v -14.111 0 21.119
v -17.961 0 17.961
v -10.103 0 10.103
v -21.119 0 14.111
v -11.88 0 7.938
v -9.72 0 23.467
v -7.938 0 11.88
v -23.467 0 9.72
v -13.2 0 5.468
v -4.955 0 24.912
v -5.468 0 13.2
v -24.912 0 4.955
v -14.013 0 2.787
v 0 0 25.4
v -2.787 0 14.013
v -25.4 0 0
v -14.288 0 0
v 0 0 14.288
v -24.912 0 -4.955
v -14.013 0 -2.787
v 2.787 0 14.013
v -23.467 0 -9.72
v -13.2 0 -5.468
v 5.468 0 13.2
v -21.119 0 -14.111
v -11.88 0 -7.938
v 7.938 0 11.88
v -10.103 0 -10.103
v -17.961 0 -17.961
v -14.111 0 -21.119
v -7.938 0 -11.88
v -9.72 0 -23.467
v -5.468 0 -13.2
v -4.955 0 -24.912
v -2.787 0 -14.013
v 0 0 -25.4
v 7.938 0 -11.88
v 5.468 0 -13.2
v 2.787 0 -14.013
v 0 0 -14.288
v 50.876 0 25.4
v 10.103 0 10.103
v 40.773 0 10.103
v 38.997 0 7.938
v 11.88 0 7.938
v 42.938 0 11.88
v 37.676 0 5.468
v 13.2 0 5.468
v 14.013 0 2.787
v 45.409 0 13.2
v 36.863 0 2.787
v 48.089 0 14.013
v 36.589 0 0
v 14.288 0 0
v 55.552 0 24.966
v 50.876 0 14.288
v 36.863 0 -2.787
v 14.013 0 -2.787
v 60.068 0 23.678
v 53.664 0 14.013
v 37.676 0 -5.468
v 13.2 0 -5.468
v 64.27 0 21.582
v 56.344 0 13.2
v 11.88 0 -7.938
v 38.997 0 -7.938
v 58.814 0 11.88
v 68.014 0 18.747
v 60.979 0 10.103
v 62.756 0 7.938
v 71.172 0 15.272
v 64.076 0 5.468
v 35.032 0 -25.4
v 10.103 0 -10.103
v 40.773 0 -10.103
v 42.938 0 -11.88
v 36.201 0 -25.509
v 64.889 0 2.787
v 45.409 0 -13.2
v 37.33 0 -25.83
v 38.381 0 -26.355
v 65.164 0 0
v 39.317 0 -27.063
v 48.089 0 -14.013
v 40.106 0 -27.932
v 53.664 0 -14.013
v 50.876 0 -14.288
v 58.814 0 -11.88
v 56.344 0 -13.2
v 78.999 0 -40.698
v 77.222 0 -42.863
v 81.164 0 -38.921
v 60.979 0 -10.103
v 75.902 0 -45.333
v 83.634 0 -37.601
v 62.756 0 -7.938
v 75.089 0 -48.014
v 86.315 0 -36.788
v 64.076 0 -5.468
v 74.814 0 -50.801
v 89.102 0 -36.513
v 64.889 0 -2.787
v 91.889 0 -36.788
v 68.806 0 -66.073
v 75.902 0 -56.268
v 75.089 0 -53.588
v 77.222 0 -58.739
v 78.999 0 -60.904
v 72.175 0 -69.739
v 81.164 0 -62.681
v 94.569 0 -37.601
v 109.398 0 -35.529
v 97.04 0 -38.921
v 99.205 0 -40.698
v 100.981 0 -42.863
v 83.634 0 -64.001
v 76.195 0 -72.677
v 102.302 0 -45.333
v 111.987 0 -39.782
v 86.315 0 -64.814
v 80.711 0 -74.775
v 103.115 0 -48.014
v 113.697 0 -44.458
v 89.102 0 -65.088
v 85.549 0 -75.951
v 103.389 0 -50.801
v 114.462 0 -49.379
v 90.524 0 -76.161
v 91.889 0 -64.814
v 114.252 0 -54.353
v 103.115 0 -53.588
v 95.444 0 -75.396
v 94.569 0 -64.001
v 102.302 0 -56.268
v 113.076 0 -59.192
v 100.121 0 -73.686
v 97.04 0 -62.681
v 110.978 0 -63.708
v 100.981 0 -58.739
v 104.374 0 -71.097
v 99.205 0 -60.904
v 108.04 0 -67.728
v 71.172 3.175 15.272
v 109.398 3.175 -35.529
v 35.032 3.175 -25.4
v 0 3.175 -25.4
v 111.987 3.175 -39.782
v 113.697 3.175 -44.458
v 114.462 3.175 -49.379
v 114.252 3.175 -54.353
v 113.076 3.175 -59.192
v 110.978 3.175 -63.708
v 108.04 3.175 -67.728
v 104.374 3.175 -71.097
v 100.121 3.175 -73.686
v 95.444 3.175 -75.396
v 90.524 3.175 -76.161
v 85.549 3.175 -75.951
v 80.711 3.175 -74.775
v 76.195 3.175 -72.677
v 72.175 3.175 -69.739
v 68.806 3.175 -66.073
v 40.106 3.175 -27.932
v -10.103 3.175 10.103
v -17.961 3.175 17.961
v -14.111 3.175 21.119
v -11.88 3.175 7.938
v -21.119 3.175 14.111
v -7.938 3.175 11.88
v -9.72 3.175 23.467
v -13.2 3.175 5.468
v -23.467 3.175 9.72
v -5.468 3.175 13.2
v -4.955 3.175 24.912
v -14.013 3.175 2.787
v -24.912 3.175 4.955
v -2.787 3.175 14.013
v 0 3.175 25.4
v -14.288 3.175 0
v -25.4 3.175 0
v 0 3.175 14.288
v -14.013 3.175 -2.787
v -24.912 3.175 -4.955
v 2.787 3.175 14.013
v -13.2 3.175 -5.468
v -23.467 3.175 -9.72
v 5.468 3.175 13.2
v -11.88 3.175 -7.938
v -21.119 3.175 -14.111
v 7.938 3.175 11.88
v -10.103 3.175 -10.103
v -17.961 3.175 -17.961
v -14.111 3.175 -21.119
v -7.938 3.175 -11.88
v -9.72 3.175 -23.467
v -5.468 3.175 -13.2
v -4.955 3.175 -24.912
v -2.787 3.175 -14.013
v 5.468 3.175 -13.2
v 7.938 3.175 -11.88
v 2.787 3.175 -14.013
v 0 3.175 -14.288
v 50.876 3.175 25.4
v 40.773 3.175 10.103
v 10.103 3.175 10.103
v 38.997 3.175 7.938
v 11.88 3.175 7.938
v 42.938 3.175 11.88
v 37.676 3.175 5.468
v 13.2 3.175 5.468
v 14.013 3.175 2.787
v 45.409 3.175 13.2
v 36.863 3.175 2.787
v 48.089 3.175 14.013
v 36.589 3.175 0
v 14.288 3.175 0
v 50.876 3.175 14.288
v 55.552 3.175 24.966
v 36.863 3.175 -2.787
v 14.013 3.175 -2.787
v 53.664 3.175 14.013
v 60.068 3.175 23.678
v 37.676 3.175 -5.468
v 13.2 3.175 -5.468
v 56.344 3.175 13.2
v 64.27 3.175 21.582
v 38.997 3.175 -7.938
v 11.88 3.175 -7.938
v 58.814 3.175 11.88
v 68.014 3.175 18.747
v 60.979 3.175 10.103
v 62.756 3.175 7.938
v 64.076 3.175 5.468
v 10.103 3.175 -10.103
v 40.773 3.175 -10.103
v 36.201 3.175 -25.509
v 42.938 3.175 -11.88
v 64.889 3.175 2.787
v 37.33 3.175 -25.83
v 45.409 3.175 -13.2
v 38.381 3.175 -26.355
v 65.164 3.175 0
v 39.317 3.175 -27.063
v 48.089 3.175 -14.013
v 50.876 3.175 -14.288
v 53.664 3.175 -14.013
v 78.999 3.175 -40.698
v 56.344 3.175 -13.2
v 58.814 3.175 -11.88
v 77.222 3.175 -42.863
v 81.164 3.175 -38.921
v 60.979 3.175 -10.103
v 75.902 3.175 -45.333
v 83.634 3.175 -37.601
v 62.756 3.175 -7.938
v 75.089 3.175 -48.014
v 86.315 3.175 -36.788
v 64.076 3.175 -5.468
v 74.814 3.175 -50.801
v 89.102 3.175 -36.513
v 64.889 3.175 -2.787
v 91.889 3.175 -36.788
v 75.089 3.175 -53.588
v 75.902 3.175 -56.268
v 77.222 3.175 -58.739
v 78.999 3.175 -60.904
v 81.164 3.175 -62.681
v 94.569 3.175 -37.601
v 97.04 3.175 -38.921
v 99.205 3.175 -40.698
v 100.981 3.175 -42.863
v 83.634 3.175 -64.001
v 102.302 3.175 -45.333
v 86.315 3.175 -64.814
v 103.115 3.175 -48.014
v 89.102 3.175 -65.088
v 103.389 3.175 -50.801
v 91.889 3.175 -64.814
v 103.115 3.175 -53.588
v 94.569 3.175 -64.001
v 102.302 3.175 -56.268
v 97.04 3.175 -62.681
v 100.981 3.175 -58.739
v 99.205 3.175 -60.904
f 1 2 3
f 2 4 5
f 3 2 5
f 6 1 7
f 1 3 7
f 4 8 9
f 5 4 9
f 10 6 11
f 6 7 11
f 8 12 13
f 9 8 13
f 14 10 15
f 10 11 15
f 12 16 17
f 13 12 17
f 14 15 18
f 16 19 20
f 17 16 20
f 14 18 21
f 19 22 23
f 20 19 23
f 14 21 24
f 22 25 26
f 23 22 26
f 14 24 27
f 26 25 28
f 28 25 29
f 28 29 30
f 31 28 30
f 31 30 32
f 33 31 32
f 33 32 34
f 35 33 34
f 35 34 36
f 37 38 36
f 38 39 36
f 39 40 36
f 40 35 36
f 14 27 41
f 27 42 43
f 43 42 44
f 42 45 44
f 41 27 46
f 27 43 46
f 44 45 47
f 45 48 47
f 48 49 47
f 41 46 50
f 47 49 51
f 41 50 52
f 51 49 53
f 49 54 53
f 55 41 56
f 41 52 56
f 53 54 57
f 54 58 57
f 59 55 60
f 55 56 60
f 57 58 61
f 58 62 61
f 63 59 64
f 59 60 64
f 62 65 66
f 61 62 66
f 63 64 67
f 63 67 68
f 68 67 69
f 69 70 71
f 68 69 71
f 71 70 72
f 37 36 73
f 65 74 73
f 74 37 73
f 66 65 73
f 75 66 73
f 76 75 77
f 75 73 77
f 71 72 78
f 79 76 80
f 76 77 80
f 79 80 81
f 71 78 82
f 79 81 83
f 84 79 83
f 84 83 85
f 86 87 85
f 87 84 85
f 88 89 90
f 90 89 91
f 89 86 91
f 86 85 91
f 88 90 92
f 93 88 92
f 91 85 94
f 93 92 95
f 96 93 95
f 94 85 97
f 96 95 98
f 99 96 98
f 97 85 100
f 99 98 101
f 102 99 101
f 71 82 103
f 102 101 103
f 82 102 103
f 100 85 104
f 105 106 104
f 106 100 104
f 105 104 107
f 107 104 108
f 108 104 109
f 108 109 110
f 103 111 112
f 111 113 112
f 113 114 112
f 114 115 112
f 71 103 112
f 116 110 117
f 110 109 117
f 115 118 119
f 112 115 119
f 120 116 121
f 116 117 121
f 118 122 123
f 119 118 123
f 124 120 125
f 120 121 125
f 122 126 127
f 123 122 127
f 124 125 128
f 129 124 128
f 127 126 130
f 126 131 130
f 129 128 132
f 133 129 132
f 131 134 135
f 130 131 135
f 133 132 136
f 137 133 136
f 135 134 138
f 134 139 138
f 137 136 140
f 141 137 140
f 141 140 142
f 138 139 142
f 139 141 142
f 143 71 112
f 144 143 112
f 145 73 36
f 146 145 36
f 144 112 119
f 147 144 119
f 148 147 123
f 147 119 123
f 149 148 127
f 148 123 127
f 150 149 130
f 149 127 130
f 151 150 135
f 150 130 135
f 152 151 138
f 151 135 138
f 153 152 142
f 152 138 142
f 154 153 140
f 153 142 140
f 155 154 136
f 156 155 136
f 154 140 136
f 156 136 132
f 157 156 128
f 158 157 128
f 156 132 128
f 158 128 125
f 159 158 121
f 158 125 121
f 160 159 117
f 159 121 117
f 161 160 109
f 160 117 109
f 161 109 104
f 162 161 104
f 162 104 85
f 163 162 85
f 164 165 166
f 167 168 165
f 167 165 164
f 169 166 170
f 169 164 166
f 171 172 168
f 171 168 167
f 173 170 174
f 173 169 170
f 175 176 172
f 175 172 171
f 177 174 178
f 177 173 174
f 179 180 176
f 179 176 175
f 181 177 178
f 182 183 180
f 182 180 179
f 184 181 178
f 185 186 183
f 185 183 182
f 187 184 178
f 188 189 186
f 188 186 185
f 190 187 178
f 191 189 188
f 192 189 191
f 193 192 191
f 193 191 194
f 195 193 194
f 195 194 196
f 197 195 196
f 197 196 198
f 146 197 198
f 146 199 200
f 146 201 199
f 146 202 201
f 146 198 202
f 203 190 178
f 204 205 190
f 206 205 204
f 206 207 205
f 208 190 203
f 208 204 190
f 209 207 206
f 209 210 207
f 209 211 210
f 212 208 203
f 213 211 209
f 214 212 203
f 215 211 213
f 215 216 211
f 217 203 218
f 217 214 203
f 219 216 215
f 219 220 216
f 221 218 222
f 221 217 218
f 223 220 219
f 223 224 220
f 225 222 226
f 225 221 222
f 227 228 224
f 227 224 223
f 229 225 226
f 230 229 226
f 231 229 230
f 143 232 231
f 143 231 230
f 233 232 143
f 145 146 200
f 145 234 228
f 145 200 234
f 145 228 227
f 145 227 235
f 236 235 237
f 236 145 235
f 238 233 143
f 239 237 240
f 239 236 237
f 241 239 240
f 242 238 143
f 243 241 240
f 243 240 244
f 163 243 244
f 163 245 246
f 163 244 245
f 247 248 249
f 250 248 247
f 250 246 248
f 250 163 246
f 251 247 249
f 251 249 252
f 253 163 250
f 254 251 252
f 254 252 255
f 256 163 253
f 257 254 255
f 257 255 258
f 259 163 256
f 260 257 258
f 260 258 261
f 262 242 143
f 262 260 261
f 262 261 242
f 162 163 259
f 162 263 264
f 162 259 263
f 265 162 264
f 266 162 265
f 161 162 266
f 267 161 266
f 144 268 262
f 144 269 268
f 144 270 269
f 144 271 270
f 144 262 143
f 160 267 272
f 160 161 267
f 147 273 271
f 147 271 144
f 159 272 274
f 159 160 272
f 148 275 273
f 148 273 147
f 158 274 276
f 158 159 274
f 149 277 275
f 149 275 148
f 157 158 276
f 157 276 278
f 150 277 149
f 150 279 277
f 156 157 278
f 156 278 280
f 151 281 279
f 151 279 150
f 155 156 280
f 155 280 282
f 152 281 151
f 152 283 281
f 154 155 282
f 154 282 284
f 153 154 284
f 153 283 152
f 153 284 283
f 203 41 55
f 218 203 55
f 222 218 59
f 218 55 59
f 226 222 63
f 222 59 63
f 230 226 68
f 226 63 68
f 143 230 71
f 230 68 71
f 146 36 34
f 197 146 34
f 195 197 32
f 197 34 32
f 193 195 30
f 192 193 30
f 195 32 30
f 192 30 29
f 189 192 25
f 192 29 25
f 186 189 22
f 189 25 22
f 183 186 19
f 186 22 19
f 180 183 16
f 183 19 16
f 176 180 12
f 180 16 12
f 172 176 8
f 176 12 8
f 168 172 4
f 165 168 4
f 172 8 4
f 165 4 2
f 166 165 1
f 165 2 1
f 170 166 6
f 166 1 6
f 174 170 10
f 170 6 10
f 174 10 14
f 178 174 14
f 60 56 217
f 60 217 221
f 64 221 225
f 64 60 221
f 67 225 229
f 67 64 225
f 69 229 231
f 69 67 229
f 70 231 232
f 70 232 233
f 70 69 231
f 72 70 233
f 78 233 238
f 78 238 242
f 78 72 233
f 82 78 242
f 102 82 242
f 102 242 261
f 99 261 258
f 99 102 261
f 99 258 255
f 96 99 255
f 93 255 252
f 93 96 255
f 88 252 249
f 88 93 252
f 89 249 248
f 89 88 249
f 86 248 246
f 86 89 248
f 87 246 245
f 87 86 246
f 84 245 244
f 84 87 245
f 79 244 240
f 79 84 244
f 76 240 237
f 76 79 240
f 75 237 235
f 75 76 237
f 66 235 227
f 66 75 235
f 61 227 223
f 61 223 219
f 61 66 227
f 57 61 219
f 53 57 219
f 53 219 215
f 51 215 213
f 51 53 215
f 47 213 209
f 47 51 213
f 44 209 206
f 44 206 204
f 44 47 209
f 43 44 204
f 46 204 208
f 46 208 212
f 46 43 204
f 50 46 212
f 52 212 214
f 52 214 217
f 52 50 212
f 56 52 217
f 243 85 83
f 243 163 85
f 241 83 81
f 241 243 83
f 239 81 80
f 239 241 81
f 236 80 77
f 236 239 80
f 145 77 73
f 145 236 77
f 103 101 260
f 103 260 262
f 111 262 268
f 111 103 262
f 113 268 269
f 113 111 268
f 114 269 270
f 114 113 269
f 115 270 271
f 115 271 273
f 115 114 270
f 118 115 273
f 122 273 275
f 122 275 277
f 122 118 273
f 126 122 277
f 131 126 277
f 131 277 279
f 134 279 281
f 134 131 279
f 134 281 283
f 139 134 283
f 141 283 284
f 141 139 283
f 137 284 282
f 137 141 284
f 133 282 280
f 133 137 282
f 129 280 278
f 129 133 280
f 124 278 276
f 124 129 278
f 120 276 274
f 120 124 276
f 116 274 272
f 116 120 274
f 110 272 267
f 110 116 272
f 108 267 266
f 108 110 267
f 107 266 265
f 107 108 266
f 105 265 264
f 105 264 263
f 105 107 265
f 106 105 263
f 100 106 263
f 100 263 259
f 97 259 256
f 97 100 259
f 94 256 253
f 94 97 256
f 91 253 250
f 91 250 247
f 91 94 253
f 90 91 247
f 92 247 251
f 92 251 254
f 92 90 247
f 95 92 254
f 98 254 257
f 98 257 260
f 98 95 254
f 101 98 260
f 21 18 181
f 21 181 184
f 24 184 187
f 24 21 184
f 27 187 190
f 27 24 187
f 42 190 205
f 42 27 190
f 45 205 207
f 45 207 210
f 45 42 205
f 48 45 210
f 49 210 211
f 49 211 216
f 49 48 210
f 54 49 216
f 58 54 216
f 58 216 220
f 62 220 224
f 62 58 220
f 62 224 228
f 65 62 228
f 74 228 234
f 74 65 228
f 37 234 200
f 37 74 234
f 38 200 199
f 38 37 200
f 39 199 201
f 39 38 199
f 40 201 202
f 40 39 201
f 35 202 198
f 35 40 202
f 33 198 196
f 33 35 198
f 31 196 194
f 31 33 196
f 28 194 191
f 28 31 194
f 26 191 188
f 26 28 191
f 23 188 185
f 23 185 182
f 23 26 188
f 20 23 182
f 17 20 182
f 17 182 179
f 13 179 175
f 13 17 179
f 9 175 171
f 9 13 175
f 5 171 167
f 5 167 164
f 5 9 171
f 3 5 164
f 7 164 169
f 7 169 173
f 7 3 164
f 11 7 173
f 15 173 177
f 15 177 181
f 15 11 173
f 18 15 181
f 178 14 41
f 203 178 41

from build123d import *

# Parameters (mm, degrees)
SKETCH1_R           = 14.2875
BOSS_EXTRUDE1_DEPTH = 3.175
FILLET2_R           = 6.35


with BuildPart() as part:
    # Sketch1 → Boss-Extrude1 (new body)
    with BuildSketch(Plane(origin=(0, 0, 0), x_dir=(1, 0, 0), z_dir=(0, 1, 0))):
        with BuildLine():
            Line((71.172208723, -15.271936024), (109.397864591, 35.52897381))
            ThreePointArc((109.397864591, 35.52897381), (104.373791891, 71.096918557), (68.805847145, 66.072845858))
            Line((68.805847145, 66.072845858), (38.201154945, 25.4))
            Line((38.201154945, 25.4), (0, 25.4))
            ThreePointArc((0, 25.4), (-25.4, 0), (0, -25.4))
            Line((0, -25.4), (50.8762, -25.4))
            ThreePointArc((50.8762, -25.4), (62.217558494, -22.727375288), (71.172208723, -15.271936024))
        make_face()
        with Locations(Location((89.101855868, 50.800909834, 0), (0, 0, 270))):
            Circle(SKETCH1_R, mode=Mode.SUBTRACT)
        with Locations(Location((50.8762, 0, 0), (0, 0, 270))):
            Circle(SKETCH1_R, mode=Mode.SUBTRACT)
        with Locations(Location((0, 0, 0), (0, 0, 270))):
            Circle(SKETCH1_R, mode=Mode.SUBTRACT)
    extrude(amount=BOSS_EXTRUDE1_DEPTH)

    # Fillet2
    fillet2_edges = [part.edges().sort_by_distance(p)[0] for p in [
        (38.201154945, 1.5875, -25.4),
    ]]
    fillet(fillet2_edges, radius=FILLET2_R)


solid = part.part
